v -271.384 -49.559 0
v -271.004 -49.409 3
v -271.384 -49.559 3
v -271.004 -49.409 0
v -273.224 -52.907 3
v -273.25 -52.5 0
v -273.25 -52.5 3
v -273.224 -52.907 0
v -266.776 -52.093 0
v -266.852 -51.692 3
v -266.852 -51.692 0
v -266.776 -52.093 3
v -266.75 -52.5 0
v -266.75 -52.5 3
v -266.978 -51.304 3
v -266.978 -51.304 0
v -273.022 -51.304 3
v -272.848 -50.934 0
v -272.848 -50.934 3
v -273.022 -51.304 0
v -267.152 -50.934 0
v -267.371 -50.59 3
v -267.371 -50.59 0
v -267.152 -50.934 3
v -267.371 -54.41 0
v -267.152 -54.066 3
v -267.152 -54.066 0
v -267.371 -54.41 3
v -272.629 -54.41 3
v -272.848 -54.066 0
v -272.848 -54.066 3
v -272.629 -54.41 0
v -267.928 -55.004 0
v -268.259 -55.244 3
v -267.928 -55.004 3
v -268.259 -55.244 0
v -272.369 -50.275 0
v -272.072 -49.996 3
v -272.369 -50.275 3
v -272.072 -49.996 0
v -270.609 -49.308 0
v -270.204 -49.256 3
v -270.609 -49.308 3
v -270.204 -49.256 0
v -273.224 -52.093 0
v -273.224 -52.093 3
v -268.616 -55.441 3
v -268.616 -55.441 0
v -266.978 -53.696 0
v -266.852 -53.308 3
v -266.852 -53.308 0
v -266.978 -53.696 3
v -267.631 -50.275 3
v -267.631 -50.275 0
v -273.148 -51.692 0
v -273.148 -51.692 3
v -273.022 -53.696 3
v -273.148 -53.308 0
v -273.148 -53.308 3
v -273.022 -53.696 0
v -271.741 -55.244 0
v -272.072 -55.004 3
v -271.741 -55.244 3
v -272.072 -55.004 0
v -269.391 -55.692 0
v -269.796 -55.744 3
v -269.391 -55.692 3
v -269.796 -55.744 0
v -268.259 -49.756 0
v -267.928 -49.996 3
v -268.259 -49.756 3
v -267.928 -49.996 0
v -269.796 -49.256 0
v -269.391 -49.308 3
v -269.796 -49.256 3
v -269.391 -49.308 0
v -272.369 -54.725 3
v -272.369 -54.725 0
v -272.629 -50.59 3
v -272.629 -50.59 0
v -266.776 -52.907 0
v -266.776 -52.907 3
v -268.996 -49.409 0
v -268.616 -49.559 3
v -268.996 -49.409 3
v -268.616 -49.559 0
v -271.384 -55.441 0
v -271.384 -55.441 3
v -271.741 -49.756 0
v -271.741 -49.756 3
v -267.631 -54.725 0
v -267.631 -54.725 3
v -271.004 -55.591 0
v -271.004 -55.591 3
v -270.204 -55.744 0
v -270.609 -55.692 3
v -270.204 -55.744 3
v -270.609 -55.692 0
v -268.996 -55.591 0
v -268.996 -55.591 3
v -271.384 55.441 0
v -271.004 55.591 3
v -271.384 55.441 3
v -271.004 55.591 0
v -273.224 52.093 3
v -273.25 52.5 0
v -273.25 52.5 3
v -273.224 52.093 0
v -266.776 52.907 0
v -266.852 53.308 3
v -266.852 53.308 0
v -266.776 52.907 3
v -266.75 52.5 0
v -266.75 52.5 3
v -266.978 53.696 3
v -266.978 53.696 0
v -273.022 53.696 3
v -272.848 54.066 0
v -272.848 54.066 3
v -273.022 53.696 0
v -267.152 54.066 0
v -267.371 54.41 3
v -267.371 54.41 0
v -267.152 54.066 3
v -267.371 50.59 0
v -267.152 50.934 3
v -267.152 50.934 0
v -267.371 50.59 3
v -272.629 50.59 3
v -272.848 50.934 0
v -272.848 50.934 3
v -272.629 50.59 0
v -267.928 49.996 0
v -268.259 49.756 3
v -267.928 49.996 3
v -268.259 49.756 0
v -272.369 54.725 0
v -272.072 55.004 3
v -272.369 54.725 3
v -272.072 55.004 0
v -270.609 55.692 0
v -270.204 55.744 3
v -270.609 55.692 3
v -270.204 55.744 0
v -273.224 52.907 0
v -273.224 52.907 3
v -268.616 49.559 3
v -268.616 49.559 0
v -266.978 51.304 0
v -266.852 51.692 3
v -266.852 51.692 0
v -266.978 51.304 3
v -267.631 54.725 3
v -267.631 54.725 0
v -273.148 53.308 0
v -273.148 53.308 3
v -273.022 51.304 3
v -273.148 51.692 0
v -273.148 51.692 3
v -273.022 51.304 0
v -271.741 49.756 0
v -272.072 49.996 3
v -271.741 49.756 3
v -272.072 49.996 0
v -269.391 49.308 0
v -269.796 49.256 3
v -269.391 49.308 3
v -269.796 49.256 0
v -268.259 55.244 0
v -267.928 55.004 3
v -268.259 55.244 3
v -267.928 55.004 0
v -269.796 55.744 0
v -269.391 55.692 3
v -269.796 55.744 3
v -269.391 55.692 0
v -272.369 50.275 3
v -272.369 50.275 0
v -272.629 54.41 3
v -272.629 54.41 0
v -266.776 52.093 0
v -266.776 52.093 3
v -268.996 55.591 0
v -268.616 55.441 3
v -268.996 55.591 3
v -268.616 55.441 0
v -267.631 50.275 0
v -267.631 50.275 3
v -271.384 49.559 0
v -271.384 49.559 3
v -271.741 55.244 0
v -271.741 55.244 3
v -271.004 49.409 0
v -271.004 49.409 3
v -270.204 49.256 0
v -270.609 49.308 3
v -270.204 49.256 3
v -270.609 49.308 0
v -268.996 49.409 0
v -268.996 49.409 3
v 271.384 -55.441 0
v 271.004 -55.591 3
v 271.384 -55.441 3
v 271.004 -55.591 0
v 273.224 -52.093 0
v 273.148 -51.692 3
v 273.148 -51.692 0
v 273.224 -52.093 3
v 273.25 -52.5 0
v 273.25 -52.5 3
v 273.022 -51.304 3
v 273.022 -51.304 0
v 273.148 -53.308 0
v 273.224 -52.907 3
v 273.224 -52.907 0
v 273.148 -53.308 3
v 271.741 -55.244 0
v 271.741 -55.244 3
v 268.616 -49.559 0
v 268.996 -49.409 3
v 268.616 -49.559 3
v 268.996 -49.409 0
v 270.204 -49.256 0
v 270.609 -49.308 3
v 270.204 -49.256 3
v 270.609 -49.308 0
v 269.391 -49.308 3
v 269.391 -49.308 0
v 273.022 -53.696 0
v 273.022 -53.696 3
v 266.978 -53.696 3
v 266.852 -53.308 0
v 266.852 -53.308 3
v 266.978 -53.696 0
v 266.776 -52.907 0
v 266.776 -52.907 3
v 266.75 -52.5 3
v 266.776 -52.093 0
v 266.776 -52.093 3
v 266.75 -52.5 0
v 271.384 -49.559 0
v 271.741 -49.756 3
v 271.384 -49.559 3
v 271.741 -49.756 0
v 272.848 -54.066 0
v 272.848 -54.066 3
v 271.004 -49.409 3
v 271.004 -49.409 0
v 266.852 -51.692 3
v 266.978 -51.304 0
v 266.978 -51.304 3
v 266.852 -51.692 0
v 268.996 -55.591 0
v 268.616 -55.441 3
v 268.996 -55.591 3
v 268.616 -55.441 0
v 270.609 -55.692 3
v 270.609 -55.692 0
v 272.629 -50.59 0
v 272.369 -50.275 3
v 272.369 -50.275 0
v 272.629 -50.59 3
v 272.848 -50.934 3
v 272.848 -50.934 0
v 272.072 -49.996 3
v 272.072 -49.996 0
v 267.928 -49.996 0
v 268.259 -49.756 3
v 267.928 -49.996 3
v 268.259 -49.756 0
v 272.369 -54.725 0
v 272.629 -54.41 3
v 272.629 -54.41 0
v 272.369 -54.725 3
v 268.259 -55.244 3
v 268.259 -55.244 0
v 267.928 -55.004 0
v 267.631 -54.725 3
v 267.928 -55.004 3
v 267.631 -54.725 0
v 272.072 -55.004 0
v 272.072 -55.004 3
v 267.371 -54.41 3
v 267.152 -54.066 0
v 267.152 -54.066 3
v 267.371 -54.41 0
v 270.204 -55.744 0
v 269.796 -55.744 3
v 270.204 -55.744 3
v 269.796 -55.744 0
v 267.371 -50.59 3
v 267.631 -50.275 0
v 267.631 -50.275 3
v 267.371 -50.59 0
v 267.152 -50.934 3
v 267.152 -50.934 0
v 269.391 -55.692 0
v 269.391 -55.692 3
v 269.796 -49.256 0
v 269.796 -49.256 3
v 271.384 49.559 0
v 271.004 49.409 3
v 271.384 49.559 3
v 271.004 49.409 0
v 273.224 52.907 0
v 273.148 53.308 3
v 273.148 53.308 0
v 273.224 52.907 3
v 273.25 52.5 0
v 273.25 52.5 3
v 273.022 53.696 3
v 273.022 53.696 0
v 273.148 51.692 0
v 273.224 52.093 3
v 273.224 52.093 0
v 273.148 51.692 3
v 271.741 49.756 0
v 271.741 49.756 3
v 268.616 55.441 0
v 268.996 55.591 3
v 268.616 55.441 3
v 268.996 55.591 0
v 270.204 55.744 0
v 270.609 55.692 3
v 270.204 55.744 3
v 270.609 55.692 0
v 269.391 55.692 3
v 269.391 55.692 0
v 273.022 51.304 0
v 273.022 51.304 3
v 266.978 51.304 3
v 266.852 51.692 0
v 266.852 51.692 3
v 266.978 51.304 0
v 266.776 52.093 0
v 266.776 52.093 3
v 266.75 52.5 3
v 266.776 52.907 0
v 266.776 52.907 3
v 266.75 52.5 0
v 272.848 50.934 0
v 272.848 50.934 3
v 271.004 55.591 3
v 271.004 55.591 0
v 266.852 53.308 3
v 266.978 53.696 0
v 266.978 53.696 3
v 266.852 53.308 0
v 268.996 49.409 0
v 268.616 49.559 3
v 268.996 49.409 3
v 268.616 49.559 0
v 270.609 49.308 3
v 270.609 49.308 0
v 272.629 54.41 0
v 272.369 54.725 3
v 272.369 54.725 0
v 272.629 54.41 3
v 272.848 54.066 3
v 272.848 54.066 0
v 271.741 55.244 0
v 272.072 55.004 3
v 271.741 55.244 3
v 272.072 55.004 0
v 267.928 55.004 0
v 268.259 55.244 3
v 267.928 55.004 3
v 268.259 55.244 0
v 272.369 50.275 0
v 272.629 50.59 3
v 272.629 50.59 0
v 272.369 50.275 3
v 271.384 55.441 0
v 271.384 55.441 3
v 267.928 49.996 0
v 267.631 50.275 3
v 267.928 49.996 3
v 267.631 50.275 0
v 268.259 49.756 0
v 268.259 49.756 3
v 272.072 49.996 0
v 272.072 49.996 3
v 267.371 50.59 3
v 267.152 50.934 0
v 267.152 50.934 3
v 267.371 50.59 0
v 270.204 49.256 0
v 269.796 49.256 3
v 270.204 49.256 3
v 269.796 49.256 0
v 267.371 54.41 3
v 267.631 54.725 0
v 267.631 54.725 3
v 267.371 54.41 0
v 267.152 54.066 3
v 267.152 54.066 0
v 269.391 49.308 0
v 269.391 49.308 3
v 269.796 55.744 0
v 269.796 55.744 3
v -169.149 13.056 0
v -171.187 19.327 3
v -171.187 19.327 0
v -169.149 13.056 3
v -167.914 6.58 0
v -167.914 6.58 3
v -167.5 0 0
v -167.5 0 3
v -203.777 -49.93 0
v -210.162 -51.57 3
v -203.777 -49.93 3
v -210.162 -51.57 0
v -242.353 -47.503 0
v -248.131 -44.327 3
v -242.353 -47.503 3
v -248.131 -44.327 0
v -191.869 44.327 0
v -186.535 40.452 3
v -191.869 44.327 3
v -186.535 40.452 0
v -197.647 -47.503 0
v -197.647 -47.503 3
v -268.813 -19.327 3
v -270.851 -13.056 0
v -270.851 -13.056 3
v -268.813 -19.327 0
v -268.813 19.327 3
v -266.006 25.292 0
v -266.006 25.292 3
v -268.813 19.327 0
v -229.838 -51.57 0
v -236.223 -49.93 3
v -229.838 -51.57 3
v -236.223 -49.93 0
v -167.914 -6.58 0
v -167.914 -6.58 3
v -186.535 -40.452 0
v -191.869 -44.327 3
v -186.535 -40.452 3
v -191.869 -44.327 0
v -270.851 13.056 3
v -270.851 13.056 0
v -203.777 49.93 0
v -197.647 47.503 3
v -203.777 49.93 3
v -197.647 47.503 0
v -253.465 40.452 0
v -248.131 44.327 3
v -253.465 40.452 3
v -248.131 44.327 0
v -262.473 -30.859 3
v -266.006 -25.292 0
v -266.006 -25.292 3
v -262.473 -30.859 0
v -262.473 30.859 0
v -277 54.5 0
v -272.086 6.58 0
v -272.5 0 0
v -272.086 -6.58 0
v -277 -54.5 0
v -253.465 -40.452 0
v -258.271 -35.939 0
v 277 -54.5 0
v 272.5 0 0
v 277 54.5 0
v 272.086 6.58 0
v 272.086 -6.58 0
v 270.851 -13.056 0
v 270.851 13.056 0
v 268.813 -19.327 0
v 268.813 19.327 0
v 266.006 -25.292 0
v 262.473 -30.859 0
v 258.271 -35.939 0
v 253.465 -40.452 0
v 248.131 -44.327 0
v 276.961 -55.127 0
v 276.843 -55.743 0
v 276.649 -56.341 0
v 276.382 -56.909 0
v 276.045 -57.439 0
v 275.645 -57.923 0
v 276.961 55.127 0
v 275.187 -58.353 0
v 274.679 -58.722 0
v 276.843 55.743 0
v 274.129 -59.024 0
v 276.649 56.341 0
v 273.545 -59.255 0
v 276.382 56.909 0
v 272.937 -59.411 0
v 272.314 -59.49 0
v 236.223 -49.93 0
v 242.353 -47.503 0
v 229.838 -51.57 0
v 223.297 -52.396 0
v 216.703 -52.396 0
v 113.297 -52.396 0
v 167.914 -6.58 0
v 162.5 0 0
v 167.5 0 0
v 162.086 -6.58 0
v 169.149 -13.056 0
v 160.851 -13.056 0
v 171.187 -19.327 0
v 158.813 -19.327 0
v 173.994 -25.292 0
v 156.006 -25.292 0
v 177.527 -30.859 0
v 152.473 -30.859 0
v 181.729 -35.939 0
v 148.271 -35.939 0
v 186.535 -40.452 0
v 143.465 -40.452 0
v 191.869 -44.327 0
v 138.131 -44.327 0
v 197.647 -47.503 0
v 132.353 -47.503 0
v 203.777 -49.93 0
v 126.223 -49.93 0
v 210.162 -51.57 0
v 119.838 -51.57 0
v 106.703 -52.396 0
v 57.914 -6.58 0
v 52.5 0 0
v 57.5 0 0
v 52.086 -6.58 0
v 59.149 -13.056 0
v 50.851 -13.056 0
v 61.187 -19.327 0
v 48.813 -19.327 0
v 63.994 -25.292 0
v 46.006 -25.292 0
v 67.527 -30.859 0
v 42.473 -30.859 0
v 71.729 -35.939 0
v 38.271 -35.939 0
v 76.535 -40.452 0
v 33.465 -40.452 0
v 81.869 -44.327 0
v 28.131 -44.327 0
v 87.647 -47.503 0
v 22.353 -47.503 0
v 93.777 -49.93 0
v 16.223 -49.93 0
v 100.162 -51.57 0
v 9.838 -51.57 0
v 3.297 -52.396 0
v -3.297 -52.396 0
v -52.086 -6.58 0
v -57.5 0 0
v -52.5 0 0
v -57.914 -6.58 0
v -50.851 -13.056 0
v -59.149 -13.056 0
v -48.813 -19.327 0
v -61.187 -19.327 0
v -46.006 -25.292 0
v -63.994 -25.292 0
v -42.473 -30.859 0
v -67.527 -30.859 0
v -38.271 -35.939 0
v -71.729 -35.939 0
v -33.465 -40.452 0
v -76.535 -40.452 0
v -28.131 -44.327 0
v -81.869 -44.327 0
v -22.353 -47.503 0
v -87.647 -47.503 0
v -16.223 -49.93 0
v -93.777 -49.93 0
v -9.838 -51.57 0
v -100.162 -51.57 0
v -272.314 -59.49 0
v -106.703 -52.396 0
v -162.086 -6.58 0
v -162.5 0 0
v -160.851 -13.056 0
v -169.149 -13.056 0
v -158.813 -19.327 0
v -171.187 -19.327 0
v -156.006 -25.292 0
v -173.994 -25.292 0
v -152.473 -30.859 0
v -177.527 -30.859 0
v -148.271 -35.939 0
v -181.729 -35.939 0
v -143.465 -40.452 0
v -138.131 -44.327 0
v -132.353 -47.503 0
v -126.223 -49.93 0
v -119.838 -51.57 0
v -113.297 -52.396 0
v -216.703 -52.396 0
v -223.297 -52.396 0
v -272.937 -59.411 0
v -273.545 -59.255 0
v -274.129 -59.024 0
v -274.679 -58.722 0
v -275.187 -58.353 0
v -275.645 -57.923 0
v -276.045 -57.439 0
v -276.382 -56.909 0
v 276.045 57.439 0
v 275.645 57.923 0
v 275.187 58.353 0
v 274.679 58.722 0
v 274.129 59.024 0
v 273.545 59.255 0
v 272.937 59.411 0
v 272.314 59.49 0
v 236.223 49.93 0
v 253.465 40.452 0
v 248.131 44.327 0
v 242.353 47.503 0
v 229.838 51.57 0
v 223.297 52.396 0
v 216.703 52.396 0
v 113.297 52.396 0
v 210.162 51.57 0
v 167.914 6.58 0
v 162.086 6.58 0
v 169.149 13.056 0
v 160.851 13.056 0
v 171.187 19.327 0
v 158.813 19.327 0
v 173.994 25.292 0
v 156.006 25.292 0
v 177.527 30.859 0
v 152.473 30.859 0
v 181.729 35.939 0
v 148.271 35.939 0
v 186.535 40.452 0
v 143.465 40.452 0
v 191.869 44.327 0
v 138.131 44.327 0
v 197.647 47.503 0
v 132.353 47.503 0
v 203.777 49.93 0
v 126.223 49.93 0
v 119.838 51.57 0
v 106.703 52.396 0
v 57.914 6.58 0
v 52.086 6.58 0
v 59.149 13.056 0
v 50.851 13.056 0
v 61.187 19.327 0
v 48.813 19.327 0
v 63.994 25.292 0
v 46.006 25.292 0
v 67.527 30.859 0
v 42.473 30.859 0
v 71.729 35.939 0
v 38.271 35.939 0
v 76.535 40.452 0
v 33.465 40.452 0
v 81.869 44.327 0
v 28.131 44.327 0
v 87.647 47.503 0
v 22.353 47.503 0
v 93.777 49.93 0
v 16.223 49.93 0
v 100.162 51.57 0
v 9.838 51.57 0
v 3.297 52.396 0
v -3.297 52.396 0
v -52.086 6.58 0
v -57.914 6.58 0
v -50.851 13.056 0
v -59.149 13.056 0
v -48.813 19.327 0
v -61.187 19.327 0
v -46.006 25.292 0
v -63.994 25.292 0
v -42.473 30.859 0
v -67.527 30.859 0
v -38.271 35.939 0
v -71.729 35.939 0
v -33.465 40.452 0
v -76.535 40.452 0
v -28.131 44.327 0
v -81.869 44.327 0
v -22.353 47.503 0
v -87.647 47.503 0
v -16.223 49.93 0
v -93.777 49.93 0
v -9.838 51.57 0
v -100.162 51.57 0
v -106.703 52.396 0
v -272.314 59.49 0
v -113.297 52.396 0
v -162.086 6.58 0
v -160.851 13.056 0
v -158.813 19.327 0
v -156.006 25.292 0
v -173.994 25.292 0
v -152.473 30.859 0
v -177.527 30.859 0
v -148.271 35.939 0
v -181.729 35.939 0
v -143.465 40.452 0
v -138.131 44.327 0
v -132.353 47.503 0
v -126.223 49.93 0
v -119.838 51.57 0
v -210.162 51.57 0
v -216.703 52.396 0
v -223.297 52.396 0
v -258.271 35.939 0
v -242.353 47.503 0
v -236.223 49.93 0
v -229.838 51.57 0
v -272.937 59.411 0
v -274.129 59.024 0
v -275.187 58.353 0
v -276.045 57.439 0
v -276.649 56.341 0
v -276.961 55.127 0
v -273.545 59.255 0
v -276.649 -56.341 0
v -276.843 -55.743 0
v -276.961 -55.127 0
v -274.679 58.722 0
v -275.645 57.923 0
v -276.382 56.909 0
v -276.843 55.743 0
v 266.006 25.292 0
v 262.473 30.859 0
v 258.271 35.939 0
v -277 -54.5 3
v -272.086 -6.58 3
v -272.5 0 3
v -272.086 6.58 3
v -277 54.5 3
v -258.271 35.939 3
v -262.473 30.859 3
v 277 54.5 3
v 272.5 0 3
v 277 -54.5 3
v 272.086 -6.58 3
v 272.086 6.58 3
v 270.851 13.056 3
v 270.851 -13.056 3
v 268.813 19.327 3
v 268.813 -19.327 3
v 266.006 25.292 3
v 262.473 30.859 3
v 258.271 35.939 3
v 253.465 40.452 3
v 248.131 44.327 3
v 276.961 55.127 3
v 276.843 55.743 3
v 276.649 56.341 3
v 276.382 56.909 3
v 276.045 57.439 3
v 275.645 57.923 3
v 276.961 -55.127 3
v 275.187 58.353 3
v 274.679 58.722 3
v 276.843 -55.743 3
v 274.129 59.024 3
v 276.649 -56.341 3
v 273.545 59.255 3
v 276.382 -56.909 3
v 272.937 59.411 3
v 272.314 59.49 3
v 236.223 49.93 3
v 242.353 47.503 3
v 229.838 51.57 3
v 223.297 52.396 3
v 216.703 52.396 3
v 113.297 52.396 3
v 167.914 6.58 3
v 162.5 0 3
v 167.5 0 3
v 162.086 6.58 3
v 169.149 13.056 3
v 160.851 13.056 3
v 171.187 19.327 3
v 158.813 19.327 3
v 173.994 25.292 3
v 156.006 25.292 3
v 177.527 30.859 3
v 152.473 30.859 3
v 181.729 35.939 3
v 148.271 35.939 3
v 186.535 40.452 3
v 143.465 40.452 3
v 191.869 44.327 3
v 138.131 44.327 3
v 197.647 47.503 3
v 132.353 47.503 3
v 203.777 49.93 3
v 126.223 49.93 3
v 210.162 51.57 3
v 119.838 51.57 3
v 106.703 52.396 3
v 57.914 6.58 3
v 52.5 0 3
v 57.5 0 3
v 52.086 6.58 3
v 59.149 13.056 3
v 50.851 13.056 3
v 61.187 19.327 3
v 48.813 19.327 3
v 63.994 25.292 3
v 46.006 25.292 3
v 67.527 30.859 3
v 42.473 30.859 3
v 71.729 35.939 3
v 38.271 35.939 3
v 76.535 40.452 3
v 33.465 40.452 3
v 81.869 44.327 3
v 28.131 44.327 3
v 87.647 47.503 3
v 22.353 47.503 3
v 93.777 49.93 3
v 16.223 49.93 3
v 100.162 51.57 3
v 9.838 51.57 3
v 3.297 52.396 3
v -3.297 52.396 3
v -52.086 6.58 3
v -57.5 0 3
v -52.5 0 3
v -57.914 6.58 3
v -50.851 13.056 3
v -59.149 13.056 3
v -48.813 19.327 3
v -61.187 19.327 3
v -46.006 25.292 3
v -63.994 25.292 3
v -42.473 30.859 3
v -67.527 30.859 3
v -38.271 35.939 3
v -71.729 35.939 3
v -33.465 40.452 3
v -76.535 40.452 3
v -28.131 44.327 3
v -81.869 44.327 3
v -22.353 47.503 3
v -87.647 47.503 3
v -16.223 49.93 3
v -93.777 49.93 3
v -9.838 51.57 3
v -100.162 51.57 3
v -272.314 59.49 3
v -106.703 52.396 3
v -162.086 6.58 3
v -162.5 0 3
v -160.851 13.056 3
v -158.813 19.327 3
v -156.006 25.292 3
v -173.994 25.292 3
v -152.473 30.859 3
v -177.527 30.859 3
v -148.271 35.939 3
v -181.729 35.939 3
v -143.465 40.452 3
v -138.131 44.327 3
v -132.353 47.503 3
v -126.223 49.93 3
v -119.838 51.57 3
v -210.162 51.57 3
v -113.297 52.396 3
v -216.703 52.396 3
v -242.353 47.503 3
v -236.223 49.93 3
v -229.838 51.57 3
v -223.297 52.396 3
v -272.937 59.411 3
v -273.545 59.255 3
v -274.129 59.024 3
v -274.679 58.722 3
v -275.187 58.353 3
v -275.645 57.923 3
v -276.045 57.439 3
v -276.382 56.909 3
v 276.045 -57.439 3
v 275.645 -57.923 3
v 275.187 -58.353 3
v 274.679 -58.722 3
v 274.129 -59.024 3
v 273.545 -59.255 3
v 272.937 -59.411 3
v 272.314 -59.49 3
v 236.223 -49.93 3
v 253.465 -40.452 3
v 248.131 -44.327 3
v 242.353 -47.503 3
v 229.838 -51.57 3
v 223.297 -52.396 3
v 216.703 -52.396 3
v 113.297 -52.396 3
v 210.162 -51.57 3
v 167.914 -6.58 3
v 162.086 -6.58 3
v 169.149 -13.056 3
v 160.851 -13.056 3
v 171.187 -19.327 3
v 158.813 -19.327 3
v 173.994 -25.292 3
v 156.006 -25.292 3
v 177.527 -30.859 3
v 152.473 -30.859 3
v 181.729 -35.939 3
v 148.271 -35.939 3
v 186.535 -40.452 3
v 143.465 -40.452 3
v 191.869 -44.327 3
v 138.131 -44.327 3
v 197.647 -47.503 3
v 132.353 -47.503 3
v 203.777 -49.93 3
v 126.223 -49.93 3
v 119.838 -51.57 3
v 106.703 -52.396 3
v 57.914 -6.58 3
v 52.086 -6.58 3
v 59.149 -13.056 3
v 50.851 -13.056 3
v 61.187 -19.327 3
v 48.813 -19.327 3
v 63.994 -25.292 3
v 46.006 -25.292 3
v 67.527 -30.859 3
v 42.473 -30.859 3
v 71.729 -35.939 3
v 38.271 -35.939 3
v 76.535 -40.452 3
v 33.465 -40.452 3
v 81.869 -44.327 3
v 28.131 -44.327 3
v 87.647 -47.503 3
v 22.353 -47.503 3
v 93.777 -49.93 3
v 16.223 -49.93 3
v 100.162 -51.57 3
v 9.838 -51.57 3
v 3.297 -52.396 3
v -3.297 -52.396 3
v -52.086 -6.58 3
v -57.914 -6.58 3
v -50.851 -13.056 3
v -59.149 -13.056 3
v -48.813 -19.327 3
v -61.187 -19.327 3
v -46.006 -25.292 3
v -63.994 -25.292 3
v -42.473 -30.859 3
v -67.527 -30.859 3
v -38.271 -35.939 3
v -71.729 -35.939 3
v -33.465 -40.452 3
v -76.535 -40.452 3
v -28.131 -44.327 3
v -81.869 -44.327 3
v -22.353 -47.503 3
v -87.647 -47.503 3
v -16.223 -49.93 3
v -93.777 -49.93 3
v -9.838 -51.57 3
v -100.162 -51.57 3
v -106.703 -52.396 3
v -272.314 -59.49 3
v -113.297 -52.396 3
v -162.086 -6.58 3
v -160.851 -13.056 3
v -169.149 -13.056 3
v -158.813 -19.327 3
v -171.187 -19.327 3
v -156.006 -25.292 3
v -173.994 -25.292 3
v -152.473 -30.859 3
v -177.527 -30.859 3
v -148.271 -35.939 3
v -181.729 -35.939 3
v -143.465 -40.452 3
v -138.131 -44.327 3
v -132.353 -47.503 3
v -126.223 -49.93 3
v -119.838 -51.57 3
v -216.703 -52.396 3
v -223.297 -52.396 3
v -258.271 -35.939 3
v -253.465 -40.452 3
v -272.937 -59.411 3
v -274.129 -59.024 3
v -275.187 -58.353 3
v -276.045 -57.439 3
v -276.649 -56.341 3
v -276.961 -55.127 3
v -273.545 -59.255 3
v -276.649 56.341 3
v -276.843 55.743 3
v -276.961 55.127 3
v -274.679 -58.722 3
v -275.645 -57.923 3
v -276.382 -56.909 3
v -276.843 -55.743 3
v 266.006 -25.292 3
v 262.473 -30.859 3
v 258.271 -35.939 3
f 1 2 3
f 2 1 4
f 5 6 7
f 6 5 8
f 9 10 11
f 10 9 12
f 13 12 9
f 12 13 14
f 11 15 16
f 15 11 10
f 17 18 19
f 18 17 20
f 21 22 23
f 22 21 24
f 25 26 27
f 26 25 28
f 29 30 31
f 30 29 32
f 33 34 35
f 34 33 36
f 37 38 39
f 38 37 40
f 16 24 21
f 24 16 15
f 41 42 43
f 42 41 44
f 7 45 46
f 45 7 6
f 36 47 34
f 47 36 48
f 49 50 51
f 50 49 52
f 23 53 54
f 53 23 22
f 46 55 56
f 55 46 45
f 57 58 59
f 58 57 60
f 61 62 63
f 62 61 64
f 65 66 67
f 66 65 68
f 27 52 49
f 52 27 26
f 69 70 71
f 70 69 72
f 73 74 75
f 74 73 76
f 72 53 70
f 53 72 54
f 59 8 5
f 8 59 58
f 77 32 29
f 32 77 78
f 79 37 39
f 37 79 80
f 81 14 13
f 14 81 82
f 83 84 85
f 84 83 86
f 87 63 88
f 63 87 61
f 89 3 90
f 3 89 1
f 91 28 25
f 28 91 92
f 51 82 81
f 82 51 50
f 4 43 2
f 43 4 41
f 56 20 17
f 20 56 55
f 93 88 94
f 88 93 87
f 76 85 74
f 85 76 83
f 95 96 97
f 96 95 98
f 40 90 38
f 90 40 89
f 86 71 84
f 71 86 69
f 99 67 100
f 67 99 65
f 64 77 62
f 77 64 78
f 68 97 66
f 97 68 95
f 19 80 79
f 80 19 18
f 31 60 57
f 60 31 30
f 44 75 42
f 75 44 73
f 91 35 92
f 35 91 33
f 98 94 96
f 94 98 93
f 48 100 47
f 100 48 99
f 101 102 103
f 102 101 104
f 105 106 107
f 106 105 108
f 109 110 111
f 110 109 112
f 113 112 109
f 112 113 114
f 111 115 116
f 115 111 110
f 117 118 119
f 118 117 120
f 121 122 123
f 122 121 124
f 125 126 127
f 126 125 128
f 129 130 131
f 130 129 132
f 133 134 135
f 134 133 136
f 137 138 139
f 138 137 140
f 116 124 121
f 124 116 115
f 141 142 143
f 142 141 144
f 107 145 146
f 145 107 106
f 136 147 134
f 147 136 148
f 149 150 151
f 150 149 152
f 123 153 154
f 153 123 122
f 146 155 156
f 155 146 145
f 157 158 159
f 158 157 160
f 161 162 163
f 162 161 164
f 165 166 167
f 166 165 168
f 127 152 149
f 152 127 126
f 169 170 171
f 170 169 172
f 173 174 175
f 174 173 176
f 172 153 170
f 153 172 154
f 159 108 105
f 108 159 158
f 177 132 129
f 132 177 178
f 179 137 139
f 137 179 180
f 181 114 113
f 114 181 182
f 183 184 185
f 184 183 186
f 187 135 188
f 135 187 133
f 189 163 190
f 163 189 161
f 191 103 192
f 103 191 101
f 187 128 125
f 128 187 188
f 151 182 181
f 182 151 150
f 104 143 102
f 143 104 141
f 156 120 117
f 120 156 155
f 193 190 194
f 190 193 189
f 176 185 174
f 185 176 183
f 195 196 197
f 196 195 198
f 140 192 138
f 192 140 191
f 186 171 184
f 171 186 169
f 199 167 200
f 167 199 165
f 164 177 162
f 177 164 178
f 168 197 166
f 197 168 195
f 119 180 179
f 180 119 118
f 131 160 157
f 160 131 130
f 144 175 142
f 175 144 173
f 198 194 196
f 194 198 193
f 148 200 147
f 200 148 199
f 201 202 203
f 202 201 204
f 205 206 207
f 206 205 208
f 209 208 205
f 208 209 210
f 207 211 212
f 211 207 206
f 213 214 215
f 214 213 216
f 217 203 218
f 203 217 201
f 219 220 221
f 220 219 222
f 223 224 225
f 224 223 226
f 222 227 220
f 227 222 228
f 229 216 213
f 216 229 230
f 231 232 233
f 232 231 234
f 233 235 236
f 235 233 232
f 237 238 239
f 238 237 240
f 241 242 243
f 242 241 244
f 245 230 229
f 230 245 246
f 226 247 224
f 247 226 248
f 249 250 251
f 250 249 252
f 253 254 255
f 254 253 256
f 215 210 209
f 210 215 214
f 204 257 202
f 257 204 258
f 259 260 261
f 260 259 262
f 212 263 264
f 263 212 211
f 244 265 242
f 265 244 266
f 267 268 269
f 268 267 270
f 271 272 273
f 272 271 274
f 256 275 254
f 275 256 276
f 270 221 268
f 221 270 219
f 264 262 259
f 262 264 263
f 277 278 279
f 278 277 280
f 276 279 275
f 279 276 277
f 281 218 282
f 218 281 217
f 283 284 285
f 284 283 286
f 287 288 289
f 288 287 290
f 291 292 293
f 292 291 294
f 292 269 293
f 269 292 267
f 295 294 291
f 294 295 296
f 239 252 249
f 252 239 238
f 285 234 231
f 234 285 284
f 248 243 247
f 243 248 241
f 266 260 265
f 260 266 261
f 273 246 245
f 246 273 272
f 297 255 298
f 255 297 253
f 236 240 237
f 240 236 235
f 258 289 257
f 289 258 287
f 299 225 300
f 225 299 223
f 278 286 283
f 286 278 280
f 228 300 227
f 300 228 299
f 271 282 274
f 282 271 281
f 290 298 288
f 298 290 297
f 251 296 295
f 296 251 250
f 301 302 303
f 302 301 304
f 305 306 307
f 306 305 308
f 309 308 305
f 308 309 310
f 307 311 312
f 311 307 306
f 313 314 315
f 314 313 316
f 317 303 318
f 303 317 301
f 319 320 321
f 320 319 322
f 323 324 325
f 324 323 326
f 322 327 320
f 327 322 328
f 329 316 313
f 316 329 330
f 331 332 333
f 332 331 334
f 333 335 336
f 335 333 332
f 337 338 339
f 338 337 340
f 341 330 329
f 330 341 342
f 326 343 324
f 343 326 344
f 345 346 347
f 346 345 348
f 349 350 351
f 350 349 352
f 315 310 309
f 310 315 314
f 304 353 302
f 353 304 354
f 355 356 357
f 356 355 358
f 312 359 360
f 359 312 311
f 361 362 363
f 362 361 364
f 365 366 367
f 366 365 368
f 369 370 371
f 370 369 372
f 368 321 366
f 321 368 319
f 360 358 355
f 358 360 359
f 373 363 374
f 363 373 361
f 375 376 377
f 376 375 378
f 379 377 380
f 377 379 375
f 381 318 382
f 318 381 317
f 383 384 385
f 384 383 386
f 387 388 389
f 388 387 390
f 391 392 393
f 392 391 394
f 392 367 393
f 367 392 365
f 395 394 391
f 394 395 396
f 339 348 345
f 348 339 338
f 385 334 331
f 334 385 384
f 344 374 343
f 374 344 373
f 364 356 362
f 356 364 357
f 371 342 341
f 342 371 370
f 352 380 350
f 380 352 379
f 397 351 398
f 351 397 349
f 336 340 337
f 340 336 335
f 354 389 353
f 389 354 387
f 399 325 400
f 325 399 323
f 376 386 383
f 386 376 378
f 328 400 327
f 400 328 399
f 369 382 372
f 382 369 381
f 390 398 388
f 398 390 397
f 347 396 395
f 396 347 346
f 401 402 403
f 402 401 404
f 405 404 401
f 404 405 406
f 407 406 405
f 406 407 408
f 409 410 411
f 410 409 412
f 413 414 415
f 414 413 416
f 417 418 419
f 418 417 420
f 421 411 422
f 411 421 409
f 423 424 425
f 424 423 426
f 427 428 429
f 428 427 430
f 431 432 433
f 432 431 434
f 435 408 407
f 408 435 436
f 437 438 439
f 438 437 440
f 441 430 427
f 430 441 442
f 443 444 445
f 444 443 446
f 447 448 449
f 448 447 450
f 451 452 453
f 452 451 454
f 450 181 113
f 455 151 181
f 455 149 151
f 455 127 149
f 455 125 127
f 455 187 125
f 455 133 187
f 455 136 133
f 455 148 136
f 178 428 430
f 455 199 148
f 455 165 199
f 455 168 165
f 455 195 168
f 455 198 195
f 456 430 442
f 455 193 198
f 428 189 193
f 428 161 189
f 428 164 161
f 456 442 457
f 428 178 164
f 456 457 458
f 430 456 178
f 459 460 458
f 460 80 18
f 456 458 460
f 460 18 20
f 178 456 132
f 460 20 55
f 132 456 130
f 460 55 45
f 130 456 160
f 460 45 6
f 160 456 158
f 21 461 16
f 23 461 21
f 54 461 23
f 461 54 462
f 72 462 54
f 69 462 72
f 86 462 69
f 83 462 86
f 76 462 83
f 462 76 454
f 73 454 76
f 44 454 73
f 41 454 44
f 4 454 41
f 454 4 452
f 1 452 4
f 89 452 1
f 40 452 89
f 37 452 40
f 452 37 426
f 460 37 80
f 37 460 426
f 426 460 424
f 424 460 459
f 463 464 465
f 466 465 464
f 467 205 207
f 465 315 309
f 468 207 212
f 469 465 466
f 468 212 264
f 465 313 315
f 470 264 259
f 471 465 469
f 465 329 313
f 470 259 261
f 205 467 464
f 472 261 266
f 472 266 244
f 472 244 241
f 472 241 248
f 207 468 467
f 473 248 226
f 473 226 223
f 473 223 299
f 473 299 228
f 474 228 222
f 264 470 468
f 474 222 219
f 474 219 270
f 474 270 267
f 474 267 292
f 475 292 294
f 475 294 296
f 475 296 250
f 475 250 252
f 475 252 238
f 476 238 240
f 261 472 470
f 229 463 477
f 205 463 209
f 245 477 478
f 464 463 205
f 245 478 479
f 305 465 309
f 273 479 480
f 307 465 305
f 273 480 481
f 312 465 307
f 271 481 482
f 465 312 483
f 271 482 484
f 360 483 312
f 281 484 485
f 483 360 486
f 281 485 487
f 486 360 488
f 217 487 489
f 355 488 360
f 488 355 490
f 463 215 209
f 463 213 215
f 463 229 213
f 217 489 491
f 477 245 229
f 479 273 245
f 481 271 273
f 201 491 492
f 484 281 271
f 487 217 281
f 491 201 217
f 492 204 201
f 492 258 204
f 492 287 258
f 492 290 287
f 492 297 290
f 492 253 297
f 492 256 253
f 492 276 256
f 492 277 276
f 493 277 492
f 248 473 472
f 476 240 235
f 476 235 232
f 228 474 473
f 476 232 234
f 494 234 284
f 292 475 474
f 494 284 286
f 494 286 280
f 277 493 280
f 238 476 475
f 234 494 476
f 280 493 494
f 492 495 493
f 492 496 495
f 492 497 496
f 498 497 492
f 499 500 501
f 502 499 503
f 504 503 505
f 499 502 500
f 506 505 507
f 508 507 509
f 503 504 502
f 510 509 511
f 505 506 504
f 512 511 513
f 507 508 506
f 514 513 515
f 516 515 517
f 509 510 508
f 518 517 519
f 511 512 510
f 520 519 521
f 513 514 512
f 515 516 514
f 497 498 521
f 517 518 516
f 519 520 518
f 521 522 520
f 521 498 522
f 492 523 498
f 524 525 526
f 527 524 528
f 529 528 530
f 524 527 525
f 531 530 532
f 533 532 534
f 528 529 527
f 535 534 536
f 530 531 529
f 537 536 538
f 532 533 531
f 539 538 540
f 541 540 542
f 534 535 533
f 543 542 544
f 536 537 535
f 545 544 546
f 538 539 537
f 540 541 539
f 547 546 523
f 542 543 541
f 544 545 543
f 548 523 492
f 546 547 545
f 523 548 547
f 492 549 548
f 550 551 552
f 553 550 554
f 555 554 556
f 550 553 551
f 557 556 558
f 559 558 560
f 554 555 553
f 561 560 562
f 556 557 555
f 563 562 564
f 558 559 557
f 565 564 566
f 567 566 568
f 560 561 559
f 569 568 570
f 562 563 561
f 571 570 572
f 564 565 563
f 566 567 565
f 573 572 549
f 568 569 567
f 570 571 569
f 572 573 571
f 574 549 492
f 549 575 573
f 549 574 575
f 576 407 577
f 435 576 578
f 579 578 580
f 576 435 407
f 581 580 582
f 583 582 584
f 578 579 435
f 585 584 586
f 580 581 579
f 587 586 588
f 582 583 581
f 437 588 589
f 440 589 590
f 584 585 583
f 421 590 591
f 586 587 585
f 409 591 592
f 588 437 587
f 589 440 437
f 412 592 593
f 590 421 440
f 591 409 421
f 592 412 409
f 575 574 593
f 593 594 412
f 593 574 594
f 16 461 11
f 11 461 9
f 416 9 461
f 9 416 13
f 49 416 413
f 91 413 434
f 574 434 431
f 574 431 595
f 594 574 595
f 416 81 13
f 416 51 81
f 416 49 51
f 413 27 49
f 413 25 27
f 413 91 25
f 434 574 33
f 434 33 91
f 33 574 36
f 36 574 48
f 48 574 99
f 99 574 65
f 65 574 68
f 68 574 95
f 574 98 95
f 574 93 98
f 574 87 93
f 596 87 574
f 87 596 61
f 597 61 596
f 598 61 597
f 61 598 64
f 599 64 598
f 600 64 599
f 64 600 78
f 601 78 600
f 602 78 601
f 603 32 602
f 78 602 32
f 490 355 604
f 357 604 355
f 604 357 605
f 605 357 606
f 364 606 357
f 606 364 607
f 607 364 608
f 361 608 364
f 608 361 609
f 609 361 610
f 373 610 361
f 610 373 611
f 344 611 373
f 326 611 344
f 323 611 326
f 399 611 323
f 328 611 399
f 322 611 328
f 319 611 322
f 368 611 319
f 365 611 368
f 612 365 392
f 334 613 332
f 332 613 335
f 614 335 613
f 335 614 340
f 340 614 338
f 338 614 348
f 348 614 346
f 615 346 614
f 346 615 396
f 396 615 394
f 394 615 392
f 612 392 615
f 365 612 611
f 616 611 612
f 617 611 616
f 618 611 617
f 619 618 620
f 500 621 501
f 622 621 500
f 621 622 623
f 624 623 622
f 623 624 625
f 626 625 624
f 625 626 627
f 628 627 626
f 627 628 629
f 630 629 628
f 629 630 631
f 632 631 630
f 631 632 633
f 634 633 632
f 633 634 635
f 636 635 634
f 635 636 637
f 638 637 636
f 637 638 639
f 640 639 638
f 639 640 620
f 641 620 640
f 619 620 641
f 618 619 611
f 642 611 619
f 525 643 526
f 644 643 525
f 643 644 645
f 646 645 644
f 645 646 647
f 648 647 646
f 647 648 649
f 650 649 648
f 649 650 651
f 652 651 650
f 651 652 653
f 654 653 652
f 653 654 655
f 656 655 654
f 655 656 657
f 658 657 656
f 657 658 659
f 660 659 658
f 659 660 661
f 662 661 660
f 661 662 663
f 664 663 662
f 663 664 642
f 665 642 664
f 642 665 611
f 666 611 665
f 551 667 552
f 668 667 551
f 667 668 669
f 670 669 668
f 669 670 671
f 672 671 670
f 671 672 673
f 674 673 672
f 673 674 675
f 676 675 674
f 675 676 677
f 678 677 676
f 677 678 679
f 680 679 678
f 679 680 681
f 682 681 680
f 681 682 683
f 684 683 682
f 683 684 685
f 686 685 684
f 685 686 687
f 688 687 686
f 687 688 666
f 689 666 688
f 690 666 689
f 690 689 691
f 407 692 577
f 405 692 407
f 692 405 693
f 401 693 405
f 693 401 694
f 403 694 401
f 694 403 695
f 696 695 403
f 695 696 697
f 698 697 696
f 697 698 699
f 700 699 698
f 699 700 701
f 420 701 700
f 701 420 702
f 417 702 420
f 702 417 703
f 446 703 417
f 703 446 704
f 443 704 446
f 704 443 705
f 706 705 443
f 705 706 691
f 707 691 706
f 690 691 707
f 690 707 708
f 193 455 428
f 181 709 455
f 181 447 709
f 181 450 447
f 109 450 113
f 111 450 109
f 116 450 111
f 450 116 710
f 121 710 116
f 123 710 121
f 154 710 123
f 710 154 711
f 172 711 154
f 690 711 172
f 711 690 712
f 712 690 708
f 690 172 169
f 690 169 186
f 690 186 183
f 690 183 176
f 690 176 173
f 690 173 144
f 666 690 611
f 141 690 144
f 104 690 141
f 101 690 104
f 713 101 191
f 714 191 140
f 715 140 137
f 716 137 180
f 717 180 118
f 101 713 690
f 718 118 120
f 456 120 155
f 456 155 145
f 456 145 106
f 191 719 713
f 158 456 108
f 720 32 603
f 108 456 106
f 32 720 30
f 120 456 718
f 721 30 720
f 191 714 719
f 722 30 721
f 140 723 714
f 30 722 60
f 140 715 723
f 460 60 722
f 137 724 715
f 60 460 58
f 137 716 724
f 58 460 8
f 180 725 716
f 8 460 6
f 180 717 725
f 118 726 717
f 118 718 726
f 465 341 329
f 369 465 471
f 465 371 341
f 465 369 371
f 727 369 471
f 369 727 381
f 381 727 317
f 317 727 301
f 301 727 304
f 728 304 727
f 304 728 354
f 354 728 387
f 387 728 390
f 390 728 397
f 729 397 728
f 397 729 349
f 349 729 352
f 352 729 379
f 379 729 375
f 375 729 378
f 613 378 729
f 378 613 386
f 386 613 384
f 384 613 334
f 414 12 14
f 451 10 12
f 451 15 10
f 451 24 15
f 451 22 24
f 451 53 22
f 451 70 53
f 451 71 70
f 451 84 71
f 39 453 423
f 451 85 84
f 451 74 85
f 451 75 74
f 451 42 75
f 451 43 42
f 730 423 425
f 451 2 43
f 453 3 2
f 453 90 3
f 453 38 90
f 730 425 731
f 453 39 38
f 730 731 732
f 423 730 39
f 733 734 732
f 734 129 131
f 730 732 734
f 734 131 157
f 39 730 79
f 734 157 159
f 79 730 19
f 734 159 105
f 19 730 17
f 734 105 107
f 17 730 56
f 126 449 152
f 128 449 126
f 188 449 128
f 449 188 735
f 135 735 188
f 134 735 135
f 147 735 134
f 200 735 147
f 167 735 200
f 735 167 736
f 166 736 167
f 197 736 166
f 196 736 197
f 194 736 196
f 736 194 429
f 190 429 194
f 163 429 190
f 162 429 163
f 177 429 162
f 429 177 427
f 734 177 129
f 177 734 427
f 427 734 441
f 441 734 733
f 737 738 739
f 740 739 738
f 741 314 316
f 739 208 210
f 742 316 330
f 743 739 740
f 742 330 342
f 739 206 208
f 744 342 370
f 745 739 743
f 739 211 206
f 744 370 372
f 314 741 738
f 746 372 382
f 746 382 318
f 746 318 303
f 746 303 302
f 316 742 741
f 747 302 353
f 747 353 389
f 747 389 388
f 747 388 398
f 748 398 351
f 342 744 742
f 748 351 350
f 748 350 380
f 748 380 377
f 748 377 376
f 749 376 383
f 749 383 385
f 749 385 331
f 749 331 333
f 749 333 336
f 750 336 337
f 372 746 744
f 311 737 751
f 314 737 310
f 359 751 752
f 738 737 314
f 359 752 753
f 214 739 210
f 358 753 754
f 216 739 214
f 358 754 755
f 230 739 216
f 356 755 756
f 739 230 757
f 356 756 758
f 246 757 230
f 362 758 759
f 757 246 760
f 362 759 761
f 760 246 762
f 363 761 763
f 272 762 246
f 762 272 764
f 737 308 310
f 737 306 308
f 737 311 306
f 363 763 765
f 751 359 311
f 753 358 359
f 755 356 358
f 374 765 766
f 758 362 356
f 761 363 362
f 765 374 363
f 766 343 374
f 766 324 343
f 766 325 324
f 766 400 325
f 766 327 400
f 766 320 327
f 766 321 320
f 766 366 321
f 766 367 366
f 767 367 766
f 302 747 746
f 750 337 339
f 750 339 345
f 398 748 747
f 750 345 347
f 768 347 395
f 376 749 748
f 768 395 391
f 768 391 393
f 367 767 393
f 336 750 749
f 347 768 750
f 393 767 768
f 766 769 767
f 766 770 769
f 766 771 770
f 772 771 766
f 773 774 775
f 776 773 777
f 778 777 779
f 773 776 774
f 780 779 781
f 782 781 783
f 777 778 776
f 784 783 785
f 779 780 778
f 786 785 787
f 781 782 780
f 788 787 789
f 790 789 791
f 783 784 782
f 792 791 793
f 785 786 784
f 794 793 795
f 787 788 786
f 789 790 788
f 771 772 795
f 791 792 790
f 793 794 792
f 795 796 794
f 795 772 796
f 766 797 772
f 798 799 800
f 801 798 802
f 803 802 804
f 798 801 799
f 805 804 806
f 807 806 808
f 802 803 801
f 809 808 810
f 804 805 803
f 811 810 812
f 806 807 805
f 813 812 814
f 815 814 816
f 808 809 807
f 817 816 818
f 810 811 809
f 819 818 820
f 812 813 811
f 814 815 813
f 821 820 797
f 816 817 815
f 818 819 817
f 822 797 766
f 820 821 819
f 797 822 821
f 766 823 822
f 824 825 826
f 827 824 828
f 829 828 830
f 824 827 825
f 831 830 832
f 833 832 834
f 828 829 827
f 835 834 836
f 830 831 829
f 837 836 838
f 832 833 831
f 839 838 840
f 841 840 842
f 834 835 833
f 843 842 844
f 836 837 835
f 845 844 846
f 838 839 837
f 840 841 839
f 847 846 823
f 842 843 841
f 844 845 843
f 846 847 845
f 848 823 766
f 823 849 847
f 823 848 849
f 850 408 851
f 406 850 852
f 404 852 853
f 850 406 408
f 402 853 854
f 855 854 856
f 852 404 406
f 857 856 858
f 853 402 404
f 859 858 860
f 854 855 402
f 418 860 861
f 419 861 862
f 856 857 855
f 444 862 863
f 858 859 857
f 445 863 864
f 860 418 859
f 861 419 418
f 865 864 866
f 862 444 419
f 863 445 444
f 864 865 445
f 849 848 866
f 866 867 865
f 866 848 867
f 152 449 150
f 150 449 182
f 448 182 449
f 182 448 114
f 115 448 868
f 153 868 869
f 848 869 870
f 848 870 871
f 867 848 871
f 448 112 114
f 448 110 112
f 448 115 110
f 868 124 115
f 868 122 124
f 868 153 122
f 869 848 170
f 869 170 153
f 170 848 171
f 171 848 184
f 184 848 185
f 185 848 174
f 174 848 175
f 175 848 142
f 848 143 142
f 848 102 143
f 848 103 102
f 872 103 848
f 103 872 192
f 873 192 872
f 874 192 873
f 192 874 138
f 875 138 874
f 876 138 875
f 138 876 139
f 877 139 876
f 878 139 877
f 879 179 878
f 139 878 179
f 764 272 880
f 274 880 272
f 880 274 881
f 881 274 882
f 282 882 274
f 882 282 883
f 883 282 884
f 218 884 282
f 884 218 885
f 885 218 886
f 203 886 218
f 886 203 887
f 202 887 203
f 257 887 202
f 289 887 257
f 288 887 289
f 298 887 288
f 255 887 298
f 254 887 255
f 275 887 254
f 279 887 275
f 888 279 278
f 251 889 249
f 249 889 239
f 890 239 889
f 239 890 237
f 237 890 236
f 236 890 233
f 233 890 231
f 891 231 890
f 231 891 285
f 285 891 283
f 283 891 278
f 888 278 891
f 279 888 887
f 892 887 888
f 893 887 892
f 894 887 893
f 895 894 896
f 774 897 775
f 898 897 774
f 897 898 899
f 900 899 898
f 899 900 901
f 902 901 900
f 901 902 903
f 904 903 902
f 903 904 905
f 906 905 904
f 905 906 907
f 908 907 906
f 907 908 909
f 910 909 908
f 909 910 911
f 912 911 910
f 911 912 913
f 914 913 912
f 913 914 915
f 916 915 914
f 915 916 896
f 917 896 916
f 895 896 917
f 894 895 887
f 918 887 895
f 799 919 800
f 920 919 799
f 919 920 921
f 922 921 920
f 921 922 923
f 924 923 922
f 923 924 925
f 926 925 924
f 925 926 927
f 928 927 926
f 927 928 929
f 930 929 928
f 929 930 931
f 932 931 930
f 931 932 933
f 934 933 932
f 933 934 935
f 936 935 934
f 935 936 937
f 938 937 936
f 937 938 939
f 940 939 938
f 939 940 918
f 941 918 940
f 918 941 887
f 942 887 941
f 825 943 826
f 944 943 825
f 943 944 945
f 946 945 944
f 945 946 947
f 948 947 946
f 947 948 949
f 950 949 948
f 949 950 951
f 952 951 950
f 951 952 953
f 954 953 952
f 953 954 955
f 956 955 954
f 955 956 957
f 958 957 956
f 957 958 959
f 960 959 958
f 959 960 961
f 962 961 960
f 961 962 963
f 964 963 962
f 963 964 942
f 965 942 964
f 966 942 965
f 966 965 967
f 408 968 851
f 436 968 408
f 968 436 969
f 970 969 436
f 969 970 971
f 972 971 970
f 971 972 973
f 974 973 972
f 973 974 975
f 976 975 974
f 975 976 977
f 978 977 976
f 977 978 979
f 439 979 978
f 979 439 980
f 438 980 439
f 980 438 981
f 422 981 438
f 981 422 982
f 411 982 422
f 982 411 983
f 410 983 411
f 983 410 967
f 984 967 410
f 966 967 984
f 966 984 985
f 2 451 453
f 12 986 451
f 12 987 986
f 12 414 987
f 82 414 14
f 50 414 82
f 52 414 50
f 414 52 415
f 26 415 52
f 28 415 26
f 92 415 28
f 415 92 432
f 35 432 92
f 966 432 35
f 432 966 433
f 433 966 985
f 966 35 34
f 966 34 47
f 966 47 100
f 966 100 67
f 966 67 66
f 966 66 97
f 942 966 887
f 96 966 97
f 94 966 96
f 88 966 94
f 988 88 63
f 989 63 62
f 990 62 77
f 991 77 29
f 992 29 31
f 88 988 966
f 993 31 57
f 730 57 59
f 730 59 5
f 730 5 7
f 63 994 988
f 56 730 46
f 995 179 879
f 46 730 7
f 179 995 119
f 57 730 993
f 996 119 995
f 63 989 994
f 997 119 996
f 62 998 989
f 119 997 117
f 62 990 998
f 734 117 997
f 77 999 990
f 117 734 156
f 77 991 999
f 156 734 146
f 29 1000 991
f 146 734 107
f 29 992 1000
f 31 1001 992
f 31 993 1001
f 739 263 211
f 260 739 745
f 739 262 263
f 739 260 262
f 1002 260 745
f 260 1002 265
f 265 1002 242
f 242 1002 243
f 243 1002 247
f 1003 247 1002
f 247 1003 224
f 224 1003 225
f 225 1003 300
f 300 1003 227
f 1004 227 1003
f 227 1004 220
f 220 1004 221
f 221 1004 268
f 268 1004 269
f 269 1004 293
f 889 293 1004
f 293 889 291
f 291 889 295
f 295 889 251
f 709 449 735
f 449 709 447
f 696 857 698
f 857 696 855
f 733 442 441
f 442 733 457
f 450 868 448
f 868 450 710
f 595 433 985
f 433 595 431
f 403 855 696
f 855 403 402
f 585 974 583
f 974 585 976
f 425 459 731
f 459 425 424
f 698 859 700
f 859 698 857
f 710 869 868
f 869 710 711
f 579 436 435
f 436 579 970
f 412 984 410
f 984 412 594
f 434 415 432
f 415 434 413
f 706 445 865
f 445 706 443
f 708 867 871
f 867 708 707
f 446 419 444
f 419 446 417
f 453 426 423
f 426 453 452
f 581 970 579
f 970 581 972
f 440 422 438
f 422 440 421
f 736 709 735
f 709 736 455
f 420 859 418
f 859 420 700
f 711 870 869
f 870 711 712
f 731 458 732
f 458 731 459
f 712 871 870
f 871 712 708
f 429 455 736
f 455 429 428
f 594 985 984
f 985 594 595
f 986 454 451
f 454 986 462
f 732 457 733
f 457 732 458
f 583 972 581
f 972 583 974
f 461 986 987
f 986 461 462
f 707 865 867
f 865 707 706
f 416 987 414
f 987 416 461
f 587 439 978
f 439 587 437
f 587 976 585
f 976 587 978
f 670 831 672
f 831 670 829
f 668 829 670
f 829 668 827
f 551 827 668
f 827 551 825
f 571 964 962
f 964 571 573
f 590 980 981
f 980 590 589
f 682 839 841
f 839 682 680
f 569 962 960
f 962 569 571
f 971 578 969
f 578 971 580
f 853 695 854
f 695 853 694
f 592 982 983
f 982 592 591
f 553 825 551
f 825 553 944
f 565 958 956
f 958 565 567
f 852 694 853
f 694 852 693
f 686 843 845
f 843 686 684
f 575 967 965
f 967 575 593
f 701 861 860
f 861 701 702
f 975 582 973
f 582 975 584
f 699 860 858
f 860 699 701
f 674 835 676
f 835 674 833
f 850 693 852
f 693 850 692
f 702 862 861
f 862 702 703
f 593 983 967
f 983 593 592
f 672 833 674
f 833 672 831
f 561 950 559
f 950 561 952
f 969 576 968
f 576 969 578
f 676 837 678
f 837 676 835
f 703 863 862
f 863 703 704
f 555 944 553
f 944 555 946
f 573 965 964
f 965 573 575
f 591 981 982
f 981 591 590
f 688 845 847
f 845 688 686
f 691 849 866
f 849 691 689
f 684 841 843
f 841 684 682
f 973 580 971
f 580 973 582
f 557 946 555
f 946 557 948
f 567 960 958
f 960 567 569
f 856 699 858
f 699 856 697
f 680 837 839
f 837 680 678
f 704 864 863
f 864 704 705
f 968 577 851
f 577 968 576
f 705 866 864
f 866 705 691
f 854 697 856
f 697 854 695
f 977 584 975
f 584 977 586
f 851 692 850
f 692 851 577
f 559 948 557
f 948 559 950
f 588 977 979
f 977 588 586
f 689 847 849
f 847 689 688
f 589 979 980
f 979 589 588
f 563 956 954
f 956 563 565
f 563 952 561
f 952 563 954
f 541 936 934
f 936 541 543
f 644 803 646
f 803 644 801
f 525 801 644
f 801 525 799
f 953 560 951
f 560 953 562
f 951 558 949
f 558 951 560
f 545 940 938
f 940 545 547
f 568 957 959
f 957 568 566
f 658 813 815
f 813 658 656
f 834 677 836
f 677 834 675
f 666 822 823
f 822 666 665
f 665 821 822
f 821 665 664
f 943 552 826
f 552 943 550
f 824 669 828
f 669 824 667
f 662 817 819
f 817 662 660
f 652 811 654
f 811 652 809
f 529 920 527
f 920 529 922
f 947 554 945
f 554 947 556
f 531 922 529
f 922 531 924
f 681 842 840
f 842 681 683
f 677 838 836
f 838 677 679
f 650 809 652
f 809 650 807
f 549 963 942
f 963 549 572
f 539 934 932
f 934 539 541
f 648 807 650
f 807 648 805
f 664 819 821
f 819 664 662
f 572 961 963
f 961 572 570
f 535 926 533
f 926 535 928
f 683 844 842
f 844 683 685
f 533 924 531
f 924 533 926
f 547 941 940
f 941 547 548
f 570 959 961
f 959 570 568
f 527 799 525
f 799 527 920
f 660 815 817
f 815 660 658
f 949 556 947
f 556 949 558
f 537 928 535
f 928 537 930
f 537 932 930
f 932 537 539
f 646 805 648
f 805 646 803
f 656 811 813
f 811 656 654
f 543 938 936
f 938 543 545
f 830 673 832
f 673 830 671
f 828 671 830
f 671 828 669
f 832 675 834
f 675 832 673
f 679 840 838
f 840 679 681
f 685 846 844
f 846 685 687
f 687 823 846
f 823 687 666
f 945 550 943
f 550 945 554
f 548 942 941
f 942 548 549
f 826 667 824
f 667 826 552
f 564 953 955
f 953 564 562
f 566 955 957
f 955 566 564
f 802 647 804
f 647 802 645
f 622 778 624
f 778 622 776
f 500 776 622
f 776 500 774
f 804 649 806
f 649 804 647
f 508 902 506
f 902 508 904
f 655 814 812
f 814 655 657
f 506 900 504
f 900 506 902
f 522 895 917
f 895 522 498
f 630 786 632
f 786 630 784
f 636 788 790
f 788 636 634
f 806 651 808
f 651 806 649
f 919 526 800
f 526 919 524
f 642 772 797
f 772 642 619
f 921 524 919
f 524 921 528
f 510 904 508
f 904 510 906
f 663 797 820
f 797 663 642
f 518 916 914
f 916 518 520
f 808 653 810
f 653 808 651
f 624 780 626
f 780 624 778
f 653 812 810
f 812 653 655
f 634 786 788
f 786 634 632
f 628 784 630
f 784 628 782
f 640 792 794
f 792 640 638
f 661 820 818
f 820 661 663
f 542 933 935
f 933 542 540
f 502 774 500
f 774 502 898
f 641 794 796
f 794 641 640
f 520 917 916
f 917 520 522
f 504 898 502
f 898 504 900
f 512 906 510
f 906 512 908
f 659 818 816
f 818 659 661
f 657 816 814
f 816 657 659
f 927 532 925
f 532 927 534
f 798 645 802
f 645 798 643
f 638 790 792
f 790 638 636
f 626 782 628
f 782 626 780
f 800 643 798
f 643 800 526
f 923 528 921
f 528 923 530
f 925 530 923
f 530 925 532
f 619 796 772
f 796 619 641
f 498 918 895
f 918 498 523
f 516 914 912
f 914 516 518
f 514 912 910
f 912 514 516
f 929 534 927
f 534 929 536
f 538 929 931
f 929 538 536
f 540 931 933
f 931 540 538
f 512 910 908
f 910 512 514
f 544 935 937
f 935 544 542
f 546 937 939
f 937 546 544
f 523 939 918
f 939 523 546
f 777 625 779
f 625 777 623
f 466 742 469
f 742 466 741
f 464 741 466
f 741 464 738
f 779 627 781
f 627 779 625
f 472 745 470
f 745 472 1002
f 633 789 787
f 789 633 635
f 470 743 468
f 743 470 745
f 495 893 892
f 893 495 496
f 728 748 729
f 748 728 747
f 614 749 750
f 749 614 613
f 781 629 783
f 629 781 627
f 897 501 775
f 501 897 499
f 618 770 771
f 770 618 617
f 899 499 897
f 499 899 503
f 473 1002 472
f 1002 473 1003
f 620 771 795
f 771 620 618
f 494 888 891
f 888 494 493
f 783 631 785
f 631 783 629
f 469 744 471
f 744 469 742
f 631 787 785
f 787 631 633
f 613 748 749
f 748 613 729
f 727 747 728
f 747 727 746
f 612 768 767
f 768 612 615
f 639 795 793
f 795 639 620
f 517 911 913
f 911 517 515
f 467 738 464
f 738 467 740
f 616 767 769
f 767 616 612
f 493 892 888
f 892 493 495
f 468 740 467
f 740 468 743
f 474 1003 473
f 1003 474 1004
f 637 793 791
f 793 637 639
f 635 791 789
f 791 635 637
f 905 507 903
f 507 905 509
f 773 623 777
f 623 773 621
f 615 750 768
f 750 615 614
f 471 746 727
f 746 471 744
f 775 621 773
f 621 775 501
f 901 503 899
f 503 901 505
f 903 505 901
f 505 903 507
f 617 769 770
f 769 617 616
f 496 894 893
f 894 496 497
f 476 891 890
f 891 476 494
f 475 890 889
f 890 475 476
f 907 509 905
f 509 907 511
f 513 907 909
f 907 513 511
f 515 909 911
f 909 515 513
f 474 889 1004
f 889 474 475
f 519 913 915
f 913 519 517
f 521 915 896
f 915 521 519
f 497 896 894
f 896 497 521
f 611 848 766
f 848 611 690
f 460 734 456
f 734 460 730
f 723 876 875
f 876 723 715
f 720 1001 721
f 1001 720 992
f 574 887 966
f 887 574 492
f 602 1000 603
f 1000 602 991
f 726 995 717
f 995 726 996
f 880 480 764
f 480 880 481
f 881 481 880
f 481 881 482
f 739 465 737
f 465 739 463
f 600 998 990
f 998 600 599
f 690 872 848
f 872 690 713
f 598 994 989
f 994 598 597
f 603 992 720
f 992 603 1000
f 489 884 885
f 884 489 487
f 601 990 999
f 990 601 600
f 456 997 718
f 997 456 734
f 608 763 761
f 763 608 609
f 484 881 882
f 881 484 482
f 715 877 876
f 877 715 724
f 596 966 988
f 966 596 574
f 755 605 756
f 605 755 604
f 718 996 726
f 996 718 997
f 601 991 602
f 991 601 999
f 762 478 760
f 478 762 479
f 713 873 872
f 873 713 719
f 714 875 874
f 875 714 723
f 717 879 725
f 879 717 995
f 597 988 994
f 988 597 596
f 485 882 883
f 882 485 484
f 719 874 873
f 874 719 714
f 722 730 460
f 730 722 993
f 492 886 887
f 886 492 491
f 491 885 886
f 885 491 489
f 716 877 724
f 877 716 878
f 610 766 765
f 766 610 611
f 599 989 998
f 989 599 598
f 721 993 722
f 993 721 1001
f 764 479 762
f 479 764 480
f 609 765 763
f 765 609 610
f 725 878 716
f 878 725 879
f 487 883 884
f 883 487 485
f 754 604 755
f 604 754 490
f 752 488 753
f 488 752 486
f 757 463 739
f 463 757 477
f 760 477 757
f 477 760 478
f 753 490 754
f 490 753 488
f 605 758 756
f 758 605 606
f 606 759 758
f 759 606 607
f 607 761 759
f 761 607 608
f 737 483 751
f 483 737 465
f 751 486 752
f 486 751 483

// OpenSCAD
$fn = 50;

difference() {
	union() {
		hull() {
			translate(v = [-272.0, 54.5, 0]) {
				cylinder(h = 3, r = 5);
			}
			translate(v = [272.0, 54.5, 0]) {
				cylinder(h = 3, r = 5);
			}
			translate(v = [-272.0, -54.5, 0]) {
				cylinder(h = 3, r = 5);
			}
			translate(v = [272.0, -54.5, 0]) {
				cylinder(h = 3, r = 5);
			}
		}
	}
	union() {
		translate(v = [-270.0, -52.5, -100.0]) {
			cylinder(h = 200, r = 3.25);
		}
		translate(v = [-270.0, 52.5, -100.0]) {
			cylinder(h = 200, r = 3.25);
		}
		translate(v = [270.0, -52.5, -100.0]) {
			cylinder(h = 200, r = 3.25);
		}
		translate(v = [270.0, 52.5, -100.0]) {
			cylinder(h = 200, r = 3.25);
		}
		translate(v = [-270.0, -52.5, -100.0]) {
			cylinder(h = 200, r = 1.8);
		}
		translate(v = [-270.0, 52.5, -100.0]) {
			cylinder(h = 200, r = 1.8);
		}
		translate(v = [270.0, -52.5, -100.0]) {
			cylinder(h = 200, r = 1.8);
		}
		translate(v = [270.0, 52.5, -100.0]) {
			cylinder(h = 200, r = 1.8);
		}
		translate(v = [-220.0, 0, 0.0]) {
			cylinder(h = 3, r = 52.5);
		}
		translate(v = [-110.0, 0, 0.0]) {
			cylinder(h = 3, r = 52.5);
		}
		cylinder(h = 3, r = 52.5);
		translate(v = [110.0, 0, 0.0]) {
			cylinder(h = 3, r = 52.5);
		}
		translate(v = [220.0, 0, 0.0]) {
			cylinder(h = 3, r = 52.5);
		}
	}
}
